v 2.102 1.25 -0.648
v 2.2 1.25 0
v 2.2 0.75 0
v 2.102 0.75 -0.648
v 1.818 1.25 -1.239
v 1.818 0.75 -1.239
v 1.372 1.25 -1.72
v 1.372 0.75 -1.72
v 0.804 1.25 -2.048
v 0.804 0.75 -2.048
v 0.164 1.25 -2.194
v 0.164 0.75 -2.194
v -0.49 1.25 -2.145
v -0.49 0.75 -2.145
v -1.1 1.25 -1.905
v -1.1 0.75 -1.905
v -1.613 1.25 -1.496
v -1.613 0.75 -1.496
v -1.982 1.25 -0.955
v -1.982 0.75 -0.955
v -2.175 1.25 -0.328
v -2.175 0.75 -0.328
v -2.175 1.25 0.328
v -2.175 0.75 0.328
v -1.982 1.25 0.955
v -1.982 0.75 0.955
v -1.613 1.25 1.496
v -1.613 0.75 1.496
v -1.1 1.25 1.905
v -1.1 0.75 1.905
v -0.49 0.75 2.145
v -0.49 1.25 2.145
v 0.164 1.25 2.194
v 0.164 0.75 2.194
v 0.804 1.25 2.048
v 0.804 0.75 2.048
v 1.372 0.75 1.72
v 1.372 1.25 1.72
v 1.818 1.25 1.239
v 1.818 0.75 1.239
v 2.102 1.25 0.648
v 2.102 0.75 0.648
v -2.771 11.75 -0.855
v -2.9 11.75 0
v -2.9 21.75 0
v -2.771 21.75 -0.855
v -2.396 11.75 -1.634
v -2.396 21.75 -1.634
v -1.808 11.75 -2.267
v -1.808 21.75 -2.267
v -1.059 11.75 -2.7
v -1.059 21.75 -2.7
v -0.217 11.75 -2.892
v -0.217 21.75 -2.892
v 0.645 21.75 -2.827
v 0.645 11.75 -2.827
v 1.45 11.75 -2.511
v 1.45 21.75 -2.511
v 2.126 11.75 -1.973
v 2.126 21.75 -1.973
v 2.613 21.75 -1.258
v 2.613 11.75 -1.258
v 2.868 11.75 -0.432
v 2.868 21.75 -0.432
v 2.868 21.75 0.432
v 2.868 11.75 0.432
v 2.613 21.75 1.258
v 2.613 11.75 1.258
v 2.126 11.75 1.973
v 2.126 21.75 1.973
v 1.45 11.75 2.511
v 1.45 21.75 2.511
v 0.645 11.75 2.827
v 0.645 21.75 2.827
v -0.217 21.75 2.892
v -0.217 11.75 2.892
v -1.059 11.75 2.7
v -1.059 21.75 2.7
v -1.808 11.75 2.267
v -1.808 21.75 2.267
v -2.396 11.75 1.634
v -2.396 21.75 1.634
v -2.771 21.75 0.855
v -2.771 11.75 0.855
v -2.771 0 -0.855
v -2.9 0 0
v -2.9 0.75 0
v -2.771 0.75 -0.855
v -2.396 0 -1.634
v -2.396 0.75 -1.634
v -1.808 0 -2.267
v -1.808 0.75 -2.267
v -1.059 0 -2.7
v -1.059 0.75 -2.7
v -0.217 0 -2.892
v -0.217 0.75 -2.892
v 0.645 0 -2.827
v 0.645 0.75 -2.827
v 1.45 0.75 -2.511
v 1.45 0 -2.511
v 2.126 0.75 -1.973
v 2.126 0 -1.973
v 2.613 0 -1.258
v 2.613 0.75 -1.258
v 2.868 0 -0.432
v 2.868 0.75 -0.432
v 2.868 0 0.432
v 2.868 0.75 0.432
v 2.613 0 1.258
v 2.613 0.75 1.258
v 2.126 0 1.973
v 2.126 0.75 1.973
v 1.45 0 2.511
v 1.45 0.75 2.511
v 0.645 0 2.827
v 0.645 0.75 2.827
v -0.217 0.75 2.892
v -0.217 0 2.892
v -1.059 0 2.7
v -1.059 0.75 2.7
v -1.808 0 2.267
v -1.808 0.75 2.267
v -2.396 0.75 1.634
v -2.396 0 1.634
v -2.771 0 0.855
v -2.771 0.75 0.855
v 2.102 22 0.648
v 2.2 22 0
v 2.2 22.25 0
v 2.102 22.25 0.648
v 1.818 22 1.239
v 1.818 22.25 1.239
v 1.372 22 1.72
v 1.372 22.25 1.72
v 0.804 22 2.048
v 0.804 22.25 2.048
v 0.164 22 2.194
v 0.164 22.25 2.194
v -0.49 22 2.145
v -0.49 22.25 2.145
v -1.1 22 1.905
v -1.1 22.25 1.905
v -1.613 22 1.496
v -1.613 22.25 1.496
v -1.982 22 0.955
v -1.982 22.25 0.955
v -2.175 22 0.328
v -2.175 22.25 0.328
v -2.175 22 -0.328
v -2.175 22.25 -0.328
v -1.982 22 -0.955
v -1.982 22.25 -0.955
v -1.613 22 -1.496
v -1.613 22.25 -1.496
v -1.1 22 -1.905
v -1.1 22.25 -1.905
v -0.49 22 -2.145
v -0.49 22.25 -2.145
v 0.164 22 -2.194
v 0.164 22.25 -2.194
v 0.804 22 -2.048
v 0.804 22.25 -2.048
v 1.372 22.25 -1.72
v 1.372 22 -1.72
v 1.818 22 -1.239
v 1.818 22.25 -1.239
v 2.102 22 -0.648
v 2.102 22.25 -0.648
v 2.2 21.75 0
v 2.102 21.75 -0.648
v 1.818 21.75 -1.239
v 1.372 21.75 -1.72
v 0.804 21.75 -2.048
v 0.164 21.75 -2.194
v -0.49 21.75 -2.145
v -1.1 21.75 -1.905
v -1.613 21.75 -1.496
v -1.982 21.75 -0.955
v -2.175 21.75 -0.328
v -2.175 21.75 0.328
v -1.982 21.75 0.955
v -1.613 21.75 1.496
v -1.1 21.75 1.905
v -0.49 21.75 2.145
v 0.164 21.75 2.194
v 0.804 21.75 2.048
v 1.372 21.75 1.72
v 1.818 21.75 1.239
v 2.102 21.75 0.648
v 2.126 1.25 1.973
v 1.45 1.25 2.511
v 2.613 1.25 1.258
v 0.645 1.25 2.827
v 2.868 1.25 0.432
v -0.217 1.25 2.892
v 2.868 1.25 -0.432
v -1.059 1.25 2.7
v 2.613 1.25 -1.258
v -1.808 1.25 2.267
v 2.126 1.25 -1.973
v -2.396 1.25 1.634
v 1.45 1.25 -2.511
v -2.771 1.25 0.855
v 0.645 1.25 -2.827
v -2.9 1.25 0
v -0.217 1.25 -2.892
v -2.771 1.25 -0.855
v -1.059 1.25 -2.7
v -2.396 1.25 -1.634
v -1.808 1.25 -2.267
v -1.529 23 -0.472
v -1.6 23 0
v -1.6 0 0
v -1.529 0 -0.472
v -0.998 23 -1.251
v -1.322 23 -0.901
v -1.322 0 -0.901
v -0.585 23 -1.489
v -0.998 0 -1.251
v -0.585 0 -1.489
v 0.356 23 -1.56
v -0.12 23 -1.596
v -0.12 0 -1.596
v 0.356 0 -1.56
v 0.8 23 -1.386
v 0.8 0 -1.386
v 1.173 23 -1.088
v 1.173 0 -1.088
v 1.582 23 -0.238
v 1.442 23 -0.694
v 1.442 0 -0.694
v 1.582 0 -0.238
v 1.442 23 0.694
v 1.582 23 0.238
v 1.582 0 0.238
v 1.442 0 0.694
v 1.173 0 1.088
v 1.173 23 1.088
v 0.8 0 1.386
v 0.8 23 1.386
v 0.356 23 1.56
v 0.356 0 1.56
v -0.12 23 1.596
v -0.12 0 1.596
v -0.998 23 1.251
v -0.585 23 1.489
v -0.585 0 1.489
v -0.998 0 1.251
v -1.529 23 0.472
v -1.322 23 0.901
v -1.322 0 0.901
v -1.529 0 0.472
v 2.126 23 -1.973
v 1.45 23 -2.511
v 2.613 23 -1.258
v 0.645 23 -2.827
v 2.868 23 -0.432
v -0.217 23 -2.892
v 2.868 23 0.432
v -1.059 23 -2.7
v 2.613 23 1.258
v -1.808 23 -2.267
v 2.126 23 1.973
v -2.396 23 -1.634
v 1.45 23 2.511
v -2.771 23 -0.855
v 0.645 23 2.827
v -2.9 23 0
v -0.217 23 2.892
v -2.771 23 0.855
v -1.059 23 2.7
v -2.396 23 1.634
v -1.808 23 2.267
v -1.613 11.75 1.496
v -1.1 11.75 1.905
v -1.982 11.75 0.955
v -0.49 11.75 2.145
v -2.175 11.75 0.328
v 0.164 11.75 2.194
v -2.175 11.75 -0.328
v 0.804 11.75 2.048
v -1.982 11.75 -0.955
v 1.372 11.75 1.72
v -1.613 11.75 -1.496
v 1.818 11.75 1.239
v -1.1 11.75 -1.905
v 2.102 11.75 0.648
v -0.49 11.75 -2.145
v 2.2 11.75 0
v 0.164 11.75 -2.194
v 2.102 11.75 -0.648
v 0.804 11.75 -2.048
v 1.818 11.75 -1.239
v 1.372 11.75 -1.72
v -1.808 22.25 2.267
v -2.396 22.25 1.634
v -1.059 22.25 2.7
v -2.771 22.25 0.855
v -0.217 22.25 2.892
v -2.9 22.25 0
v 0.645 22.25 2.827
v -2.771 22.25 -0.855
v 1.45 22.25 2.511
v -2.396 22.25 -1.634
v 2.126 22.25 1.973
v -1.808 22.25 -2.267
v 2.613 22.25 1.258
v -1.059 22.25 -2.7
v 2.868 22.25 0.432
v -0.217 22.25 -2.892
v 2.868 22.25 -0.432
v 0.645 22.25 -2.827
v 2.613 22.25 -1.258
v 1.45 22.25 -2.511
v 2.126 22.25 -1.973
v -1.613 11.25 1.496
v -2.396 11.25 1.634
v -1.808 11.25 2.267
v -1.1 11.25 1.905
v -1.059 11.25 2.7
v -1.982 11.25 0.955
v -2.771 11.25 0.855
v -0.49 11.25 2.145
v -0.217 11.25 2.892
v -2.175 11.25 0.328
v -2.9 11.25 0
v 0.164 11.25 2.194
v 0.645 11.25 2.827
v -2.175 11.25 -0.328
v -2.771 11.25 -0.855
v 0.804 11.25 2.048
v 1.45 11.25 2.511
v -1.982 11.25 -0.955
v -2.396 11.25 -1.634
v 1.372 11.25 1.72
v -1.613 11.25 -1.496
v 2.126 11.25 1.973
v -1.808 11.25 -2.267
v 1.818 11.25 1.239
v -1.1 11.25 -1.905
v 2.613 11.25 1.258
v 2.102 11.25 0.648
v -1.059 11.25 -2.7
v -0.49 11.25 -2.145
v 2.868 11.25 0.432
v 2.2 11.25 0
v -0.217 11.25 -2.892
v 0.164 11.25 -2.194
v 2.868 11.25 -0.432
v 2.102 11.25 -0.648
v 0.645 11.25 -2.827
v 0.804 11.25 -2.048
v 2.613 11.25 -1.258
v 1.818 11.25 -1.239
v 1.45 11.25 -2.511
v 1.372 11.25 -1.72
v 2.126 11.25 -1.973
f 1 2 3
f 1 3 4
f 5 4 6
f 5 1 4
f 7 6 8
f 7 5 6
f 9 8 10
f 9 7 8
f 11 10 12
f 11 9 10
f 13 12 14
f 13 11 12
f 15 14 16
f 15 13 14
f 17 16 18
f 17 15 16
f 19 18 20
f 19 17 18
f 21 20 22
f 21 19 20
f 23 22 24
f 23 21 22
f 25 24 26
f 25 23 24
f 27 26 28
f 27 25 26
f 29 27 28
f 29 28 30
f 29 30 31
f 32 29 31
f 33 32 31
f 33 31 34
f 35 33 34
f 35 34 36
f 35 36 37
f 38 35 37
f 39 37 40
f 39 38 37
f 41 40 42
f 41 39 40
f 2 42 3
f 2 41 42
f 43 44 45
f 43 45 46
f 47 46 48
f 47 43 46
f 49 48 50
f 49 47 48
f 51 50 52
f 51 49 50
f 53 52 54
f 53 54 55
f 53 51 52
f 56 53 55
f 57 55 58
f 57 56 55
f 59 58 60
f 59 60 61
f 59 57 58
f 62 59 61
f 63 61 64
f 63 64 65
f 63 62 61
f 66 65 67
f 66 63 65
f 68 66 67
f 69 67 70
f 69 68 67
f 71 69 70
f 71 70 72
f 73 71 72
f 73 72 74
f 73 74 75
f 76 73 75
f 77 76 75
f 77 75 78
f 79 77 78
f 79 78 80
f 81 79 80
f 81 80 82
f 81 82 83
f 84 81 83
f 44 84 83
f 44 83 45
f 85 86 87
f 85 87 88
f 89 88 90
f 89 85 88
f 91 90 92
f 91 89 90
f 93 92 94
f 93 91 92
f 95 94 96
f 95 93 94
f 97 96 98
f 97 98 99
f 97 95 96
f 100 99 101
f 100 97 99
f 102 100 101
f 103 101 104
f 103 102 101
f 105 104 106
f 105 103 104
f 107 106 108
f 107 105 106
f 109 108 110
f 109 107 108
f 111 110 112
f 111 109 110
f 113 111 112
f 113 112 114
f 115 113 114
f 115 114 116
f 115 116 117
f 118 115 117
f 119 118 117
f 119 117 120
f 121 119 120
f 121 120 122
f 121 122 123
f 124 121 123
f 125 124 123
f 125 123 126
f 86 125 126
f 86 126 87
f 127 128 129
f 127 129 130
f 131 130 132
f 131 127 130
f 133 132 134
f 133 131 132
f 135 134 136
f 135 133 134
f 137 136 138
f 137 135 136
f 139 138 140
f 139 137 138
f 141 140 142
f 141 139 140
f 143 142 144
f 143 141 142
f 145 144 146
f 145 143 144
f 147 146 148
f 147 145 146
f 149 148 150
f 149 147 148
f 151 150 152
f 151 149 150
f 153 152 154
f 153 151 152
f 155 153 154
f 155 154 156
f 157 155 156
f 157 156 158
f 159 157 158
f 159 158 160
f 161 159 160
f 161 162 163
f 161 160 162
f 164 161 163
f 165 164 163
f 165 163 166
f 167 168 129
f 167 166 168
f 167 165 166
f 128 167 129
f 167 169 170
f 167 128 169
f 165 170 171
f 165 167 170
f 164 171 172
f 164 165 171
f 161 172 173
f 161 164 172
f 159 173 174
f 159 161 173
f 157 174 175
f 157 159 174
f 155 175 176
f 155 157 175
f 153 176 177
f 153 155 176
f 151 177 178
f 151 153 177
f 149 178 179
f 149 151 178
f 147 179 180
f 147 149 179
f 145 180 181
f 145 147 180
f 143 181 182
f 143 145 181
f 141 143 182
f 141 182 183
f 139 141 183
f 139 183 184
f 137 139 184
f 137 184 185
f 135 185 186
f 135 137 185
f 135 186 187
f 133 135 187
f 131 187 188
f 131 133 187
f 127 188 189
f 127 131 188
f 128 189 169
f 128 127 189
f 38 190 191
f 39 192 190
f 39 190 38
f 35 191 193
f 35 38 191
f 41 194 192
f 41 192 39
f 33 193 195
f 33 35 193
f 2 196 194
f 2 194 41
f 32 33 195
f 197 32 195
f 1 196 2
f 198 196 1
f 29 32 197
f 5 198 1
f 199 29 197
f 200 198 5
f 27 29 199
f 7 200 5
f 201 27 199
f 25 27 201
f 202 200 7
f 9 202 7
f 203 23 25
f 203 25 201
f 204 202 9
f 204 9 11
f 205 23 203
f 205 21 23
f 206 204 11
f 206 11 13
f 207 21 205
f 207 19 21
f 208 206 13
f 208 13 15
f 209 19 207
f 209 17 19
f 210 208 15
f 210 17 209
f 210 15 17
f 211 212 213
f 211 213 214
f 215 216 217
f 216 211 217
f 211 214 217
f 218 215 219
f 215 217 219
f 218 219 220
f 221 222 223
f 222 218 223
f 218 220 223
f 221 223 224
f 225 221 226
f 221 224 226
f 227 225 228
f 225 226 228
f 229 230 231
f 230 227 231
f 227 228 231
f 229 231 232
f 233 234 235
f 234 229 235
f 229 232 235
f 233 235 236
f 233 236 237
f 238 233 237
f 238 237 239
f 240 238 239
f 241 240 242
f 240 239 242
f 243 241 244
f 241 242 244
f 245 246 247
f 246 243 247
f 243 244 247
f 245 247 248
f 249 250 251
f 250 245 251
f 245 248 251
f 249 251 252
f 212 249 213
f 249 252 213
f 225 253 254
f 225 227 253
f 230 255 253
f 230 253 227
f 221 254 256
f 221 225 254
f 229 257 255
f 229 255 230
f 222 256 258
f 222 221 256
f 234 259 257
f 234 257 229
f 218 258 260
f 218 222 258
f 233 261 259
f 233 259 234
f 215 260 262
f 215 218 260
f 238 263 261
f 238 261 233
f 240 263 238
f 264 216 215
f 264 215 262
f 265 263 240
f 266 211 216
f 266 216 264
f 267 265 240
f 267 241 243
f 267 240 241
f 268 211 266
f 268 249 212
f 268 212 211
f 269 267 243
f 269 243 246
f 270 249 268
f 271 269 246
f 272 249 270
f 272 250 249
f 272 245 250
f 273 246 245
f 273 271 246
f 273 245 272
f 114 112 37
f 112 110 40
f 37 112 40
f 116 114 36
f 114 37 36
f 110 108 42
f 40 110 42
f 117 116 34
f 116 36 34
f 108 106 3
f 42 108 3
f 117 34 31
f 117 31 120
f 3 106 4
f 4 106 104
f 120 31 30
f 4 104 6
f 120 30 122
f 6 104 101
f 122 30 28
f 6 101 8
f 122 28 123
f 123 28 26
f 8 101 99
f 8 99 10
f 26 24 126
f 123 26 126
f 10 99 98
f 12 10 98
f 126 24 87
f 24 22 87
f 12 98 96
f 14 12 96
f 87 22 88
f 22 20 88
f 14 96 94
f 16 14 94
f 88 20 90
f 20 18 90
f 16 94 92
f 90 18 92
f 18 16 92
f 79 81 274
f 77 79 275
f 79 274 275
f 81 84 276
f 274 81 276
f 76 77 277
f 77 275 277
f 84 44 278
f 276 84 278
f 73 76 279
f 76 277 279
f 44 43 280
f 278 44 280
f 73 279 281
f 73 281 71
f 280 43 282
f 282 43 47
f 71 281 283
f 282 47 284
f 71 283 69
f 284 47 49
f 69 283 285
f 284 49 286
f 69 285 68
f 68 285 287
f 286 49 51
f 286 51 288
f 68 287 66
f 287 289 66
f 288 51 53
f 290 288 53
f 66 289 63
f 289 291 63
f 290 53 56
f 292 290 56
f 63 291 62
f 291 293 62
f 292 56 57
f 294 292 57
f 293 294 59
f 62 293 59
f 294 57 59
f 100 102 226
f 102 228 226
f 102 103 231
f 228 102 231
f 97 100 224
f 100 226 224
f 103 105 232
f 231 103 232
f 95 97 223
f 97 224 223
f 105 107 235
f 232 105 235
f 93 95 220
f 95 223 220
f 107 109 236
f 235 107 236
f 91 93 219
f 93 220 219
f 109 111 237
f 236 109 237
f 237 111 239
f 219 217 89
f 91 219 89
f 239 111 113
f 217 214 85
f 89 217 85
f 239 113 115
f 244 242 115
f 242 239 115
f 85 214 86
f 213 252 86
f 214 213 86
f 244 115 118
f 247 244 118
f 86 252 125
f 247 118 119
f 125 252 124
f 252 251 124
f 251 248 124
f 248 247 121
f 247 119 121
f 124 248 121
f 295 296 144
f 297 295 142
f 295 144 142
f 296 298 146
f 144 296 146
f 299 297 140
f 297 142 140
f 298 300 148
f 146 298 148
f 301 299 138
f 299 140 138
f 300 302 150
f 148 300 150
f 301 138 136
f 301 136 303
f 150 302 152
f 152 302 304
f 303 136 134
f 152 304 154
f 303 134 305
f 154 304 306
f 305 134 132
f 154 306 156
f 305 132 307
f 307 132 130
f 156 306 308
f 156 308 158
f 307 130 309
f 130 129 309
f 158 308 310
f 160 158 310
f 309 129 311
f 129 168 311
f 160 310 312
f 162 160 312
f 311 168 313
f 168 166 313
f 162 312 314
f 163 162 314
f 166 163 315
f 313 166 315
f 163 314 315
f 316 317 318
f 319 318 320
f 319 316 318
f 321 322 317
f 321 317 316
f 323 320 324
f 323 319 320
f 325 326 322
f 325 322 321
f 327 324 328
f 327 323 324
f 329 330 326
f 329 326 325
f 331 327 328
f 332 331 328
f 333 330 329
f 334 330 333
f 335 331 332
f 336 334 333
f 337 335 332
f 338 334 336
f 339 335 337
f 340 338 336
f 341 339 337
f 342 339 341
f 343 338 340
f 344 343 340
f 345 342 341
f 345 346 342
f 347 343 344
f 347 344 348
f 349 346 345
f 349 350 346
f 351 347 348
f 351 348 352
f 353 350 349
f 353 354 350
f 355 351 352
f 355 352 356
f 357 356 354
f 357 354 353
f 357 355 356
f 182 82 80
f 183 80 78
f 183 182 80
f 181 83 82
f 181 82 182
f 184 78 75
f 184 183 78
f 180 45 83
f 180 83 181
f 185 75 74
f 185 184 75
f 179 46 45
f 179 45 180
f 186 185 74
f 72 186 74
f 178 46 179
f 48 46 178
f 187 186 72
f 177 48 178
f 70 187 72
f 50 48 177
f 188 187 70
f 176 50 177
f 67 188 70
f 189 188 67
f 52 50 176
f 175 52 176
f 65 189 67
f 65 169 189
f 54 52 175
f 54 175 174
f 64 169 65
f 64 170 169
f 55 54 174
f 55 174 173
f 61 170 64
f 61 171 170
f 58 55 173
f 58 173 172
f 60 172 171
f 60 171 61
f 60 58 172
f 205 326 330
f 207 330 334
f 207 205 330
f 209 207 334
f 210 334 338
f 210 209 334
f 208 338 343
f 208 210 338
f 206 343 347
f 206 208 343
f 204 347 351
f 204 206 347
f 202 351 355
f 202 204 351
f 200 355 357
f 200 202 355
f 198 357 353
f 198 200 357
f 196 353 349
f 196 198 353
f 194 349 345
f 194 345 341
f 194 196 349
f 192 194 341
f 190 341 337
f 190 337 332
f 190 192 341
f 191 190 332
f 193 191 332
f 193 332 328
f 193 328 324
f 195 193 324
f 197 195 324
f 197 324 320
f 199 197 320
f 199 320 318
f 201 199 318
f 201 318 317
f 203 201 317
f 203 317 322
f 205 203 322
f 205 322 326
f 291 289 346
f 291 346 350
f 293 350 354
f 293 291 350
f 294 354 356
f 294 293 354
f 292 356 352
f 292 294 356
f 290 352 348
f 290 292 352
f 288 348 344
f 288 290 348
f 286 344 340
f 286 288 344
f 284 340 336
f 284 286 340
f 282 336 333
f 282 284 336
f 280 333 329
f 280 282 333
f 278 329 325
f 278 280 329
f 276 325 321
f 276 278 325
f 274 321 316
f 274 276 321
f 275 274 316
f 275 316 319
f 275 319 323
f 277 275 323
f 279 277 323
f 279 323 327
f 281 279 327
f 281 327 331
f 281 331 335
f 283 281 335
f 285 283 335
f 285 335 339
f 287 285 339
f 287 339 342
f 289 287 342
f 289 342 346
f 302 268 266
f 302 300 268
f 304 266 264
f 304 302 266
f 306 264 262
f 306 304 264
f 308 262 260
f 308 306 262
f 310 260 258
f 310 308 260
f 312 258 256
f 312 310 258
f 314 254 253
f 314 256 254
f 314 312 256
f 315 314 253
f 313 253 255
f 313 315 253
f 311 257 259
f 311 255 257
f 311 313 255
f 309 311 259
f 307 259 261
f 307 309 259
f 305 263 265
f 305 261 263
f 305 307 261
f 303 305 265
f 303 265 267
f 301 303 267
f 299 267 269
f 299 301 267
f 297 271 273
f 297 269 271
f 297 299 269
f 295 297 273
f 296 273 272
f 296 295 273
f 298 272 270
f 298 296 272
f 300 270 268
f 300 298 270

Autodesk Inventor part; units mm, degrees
ref_plane "YZ Plane" through (0, 0, 0) normal (1, 0, 0) x (0, 1, 0)
sketch "Sketch1" plane through (0, 0, 0) normal (0, 1, 0) x (-1, 0, 0)
  circle A0 centre (0, 0) radius 2.9
  circle A1 centre (0, 0) radius 1.6
  dimension "d0" = 3.2
  dimension "d1" = 5.8
extrude "Extrusion1" add sketch "Sketch1" along normal blind 23
ref_plane "Work Plane1" through (0, 11.5, 0) normal (0, 1, 0) x (1, 0, 0)
sketch "Sketch3" plane through (0, 11.5, 0) normal (0, 1, 0) x (1, 0, 0)
  circle A0 centre (0, 0) radius 1.6 construction
  circle A1 centre (0, 0) radius 2.2
  circle A2 centre (0, 0) radius 2.9 projected
  dimension "d12" = 0.7
extrude "Extrusion3" cut sketch "Sketch3" along normal mid plane 0.5
ref_plane "Work Plane2" through (0, 22, 0) normal (0, 1, 0) x (1, 0, 0)
sketch "Sketch4" plane through (0, 22, 0) normal (0, 1, 0) x (1, 0, 0)
  circle A0 centre (0, 0) radius 2.9 projected
  circle A1 centre (0, 0) radius 2.2
  dimension "d9" = 0.7
extrude "Extrusion4" cut sketch "Sketch4" along normal mid plane 0.5
mirror "Mirror1" about plane through (0, 11.5, 0) normal (0, 1, 0) of "Extrusion4"
properties part number "fullbar"
